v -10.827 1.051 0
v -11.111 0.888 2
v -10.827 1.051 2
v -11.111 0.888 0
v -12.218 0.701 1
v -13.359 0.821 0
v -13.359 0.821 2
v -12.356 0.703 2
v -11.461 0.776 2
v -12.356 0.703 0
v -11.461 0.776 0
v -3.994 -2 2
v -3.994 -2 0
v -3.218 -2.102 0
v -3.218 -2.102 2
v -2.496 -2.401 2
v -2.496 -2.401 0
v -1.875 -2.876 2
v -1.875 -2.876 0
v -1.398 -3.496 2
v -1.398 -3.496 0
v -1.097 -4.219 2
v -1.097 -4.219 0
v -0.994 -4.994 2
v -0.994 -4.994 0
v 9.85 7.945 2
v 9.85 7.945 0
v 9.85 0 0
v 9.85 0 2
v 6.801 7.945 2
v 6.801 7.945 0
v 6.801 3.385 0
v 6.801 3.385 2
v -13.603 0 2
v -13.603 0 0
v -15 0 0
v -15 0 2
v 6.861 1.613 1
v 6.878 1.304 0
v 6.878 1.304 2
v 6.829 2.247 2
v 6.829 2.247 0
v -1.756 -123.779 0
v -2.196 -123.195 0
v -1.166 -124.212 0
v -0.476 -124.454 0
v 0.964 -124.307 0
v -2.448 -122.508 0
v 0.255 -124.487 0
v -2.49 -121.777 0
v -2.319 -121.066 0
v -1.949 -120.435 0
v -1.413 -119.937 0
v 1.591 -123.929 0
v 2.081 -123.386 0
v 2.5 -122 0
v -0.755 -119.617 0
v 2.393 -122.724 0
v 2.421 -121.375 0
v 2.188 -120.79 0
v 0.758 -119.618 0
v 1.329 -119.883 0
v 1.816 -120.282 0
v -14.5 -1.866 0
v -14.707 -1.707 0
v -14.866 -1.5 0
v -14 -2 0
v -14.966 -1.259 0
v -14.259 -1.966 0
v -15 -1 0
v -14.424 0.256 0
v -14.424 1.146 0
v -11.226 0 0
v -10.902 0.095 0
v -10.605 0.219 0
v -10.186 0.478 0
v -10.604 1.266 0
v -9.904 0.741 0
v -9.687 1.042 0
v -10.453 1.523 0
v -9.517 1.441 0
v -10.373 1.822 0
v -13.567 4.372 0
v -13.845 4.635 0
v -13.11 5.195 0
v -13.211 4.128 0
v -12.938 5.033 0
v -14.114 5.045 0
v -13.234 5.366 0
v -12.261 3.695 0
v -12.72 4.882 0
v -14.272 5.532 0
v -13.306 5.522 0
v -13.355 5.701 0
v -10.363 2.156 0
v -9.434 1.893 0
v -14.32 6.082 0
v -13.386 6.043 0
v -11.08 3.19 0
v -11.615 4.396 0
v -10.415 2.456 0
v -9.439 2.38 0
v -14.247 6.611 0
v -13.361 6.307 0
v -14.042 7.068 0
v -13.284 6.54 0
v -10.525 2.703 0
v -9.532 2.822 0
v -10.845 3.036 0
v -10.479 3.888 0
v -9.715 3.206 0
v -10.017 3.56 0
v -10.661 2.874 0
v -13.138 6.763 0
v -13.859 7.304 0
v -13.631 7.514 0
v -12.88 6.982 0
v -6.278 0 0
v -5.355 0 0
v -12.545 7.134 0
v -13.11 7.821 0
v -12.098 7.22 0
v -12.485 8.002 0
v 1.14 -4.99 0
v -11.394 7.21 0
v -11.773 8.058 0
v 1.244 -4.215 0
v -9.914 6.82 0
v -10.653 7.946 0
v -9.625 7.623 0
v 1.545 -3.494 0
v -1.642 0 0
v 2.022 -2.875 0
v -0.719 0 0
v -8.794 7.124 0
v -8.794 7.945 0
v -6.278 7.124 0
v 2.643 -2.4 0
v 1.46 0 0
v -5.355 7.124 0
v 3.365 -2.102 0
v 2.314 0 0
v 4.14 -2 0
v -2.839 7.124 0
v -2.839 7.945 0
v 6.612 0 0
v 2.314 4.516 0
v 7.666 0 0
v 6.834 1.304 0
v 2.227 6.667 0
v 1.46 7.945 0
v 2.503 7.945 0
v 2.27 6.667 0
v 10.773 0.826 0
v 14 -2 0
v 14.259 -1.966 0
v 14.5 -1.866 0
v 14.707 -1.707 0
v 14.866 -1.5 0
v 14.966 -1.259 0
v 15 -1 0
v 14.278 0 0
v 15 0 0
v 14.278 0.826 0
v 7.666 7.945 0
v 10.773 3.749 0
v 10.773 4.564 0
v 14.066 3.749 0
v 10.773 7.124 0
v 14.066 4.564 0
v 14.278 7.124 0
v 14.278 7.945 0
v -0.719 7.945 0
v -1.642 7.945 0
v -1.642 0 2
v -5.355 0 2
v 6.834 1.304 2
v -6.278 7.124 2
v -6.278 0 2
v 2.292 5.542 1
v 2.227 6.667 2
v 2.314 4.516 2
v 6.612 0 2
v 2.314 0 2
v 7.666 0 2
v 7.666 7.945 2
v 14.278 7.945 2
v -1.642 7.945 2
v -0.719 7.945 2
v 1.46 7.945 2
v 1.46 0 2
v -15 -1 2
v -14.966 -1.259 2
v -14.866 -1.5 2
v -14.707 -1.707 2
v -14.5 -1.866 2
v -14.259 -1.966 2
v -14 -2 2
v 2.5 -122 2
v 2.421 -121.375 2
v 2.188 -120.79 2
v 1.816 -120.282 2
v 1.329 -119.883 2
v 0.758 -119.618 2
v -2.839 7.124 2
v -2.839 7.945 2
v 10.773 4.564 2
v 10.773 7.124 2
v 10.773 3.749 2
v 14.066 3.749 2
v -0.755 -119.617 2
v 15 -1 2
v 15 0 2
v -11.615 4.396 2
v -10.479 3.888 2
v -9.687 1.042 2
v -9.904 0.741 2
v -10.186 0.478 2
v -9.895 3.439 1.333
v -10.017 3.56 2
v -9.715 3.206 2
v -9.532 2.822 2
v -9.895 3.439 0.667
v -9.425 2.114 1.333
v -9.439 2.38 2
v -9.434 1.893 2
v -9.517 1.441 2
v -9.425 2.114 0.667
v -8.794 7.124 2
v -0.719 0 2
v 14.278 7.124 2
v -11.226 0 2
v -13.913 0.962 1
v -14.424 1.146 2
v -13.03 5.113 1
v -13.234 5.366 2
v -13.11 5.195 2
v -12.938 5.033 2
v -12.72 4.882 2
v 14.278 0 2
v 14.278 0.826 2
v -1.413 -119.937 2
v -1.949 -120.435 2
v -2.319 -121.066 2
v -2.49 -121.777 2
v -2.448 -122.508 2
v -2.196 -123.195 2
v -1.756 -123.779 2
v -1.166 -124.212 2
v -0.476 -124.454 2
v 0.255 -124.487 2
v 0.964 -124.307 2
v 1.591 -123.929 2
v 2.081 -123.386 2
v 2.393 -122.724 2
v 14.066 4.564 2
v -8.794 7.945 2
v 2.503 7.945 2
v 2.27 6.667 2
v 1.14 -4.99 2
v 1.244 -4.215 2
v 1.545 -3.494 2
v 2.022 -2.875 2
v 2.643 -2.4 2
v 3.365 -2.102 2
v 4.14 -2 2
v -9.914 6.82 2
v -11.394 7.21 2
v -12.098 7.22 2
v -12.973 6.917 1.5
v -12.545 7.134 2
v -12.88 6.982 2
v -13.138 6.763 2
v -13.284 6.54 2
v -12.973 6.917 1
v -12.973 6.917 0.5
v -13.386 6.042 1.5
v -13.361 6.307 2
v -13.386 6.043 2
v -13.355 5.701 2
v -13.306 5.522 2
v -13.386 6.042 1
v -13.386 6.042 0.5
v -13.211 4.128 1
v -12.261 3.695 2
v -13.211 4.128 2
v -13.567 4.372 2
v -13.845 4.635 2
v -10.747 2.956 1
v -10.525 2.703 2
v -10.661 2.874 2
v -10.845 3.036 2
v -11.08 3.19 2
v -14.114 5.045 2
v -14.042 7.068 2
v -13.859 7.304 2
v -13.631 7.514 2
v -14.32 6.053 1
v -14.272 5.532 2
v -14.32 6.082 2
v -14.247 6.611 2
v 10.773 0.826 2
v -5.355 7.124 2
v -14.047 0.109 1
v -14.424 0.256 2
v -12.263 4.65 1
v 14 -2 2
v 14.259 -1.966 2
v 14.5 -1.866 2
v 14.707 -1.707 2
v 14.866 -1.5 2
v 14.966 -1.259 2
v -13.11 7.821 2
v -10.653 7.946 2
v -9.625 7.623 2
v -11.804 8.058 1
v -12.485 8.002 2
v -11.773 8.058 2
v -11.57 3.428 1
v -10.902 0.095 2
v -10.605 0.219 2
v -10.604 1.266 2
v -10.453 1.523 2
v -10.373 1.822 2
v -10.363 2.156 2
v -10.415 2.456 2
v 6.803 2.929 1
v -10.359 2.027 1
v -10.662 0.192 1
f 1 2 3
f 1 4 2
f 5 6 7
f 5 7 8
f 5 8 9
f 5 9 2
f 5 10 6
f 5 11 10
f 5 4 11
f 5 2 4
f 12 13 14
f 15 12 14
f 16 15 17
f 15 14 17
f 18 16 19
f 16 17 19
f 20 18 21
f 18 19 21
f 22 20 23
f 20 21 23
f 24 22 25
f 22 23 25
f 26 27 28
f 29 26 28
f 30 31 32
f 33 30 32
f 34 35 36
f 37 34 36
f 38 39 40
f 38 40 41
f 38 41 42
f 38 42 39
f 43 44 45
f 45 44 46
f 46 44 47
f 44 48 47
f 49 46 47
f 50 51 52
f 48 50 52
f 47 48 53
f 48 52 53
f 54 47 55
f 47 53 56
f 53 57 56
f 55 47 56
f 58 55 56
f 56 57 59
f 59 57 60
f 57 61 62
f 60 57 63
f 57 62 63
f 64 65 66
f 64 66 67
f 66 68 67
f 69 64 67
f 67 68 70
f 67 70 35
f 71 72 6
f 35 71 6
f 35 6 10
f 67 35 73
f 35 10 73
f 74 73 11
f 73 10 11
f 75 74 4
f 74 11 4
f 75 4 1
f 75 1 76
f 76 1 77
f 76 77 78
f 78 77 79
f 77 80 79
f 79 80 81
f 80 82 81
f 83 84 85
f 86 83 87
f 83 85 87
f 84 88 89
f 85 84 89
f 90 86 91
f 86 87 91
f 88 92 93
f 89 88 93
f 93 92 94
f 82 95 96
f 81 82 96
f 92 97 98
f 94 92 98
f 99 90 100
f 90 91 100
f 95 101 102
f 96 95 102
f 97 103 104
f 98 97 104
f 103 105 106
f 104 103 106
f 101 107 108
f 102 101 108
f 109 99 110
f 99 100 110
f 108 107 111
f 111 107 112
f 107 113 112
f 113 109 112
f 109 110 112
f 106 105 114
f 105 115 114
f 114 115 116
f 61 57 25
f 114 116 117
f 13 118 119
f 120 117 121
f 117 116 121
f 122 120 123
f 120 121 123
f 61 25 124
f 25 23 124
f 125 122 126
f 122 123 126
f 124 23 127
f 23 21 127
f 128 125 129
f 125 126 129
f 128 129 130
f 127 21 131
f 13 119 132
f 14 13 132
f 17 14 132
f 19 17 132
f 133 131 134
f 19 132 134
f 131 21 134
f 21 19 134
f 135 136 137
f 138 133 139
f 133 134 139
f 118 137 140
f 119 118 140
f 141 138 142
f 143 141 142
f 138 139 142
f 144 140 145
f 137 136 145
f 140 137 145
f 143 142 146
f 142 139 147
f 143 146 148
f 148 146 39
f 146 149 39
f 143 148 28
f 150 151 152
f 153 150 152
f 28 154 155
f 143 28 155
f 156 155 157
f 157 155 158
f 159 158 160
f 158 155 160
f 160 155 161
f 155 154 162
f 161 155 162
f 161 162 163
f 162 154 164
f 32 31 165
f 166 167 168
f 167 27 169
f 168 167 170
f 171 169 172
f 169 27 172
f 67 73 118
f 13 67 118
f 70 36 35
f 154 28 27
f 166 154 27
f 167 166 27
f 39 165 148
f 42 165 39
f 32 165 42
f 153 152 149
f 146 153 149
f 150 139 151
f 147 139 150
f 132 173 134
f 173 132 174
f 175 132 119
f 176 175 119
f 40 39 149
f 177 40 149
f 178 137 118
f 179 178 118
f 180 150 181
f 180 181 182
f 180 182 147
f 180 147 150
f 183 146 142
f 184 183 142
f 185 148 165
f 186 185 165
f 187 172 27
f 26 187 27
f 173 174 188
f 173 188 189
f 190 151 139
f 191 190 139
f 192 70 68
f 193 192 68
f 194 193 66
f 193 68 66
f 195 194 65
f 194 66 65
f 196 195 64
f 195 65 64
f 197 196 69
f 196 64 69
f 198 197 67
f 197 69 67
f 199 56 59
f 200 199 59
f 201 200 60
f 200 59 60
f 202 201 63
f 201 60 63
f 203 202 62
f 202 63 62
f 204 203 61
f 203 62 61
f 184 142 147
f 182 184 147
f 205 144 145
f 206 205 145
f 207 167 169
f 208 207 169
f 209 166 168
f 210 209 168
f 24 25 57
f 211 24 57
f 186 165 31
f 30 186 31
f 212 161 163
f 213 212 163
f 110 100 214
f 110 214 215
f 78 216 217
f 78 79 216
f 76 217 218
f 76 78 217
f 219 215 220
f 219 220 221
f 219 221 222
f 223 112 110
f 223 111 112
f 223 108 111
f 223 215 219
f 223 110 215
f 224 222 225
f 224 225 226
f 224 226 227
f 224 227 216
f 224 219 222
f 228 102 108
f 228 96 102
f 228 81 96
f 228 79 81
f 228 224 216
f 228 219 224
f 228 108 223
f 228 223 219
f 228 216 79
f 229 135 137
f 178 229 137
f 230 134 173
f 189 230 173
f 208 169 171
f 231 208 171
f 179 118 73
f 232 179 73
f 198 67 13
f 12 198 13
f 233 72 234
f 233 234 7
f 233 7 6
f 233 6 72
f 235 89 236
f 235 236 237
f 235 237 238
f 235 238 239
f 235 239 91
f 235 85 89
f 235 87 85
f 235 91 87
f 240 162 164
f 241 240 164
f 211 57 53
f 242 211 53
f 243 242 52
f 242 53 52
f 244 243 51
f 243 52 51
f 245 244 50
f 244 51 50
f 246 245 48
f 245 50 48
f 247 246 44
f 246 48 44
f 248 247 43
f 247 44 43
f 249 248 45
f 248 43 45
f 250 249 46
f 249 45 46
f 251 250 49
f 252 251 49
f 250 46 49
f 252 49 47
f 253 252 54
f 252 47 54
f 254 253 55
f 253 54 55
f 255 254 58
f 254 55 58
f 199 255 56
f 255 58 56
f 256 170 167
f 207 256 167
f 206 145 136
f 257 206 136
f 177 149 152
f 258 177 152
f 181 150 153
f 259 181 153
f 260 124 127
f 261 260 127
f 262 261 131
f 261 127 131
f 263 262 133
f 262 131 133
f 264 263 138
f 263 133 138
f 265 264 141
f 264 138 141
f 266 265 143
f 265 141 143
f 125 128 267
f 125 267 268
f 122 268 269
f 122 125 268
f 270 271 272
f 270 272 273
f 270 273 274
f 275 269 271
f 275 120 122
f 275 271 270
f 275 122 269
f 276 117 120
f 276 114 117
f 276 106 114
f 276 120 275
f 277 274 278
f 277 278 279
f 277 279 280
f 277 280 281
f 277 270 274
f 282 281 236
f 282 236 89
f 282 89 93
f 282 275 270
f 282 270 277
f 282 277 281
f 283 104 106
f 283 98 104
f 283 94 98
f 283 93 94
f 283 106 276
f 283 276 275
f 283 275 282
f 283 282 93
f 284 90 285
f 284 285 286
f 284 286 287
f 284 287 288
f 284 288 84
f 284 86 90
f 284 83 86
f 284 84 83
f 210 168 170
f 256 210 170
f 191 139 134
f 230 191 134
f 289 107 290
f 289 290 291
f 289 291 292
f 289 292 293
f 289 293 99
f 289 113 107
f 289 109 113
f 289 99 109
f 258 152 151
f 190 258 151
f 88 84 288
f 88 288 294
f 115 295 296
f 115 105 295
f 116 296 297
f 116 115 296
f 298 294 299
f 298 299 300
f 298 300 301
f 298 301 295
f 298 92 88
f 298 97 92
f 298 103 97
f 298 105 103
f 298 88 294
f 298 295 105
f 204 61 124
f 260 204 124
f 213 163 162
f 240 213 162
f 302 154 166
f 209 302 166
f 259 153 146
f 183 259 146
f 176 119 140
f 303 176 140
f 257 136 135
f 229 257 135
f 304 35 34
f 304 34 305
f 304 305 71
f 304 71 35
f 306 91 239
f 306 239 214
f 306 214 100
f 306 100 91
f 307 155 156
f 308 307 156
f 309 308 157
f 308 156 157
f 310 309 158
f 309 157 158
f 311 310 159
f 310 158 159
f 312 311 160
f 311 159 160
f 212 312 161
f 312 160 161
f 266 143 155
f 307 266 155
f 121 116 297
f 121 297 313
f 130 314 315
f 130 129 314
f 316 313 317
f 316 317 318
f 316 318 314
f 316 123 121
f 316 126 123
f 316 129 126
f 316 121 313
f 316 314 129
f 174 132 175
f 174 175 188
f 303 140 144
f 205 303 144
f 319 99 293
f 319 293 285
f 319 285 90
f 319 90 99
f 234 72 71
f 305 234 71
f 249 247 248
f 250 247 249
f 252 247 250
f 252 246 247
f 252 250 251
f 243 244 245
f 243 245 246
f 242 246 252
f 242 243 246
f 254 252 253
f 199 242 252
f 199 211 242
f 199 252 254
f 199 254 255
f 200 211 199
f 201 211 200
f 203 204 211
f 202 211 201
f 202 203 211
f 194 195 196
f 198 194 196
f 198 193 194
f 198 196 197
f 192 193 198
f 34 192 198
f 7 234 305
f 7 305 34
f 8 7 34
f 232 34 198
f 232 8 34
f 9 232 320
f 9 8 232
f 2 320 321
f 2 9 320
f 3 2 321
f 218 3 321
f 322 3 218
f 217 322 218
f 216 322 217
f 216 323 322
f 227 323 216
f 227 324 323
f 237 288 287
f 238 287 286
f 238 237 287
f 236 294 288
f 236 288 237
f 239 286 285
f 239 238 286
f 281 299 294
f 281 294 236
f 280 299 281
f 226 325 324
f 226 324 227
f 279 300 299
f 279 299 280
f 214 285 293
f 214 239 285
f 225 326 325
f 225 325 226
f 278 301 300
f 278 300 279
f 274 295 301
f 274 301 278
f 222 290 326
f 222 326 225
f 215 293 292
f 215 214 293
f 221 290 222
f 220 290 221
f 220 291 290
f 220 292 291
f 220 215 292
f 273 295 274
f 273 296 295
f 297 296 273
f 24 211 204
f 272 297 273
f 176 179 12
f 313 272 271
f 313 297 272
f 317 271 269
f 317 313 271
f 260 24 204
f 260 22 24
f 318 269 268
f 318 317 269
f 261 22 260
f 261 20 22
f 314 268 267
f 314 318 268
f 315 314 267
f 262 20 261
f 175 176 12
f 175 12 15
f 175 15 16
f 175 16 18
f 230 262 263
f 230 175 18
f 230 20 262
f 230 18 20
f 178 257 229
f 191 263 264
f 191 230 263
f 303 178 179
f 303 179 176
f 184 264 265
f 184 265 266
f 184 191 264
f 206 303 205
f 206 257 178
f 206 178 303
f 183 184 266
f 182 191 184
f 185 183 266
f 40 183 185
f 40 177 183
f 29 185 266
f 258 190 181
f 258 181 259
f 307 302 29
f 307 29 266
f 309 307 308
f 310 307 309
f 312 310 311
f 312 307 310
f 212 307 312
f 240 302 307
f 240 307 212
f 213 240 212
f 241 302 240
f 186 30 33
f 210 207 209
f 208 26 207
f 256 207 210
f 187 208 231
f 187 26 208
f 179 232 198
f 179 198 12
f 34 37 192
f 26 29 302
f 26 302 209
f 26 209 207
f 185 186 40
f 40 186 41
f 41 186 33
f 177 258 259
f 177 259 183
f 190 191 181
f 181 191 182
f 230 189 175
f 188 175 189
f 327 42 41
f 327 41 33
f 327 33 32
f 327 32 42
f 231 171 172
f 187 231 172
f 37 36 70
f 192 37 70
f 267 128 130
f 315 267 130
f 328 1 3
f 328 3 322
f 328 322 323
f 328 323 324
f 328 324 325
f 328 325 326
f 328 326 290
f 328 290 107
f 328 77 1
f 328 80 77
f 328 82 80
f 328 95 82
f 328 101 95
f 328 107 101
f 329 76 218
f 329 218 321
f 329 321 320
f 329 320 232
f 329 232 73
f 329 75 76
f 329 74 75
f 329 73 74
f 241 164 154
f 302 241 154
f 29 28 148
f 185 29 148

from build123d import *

# Parameters (mm, degrees)
F0_W     = 0.9233176839
F0_H     = 7.9447052686
F1_DEPTH = 2


with BuildPart() as f1:
    # F0 (on Top) → F1 (new body)
    with BuildSketch(Plane.XY):
        Polygon((-6.278038602, 7.1239784385), (-6.278038602, 0), (-5.3547209181, 0), (-5.3547209181, 7.1239784385), (-2.8386367588, 7.1239784385), (-2.8386367588, 7.9447052686), (-8.7941227613, 7.9447052686), (-8.7941227613, 7.1239784385), align=None)
        with BuildLine():
            Line((-5.3547209181, 0), (-6.278038602, 0))
            Line((-6.278038602, 0), (-11.2261389214, 0))
            add(Edge.make_bspline(
                [(-11.2261389214, 0), (-11.6878851089, -0.1095461659), (-12.2509128847, -0.1095461659)],
                knots=[0.5682703015, 0.5682703015, 0.5682703015, 1, 1, 1], degree=2))
            add(Edge.make_bspline(
                [(-12.2509128847, -0.1095461659), (-13.0242578972, -0.1095461659), (-13.6025064048, 0)],
                knots=[0, 0, 0, 0.5477225575, 0.5477225575, 0.5477225575], degree=2))
            Line((-13.6025064048, 0), (-15, 0))
            Line((-15, 0), (-15, -1))
            ThreePointArc((-15, -1), (-14.7071067812, -1.7071067812), (-14, -2))
            Line((-14, -2), (-3.9937565104, -2))
            ThreePointArc((-3.9937565104, -2), (-1.8746470228, -2.8764711022), (-0.9937630208, -4.9937500136))
            Line((-0.9937630208, -4.9937500136), (-0.7549651684, -119.6167191533))
            ThreePointArc((-0.7549651684, -119.6167191533), (0.0015611574, -119.5000004874), (0.7579411203, -119.6176639074))
            Line((0.7579411203, -119.6176639074), (1.1400333331, -4.9900000556))
            ThreePointArc((1.1400333331, -4.9900000556), (2.0222347885, -2.8751470835), (4.1400166666, -2))
            Line((4.1400166666, -2), (14, -2))
            ThreePointArc((14, -2), (14.7071067812, -1.7071067812), (15, -1))
            Line((15, -1), (15, 0))
            Line((15, 0), (14.2783863676, 0))
            Line((14.2783863676, 0), (9.8495913754, 0))
            Line((9.8495913754, 0), (7.6656233698, 0))
            Line((7.6656233698, 0), (6.6118935837, 0))
            Line((6.6118935837, 0), (2.3135106938, 0))
            Line((2.3135106938, 0), (1.4597461311, 0))
            Line((1.4597461311, 0), (-0.7190053904, 0))
            Line((-0.7190053904, 0), (-1.6423230742, 0))
            Line((-1.6423230742, 0), (-5.3547209181, 0))
        make_face()
        with BuildLine():
            add(Edge.make_bspline(
                [(-11.2261389214, 0), (-11.6878851089, -0.1095461659), (-12.2509128847, -0.1095461659)],
                knots=[0.5682703015, 0.5682703015, 0.5682703015, 1, 1, 1], degree=2))
            Line((-11.2261389214, 0), (-13.6025064048, 0))
            add(Edge.make_bspline(
                [(-12.2509128847, -0.1095461659), (-13.0242578972, -0.1095461659), (-13.6025064048, 0)],
                knots=[0, 0, 0, 0.5477225575, 0.5477225575, 0.5477225575], degree=2))
        make_face()
        with BuildLine():
            Line((-13.6025064048, 0), (-11.2261389214, 0))
            add(Edge.make_bspline(
                [(-10.1860545992, 0.4781777082), (-10.6183589931, 0.1441916851), (-11.2261389214, 0)],
                knots=[0, 0, 0, 0.5682703015, 0.5682703015, 0.5682703015], degree=2))
            add(Edge.make_bspline(
                [(-9.4253173361, 2.1144148844), (-9.4253173361, 1.0659015823), (-10.1860545992, 0.4781777082)],
                knots=[0, 0, 0, 1, 1, 1], degree=2))
            add(Edge.make_bspline(
                [(-9.8948009042, 3.4394018432), (-9.4253173361, 2.9281864024), (-9.4253173361, 2.1144148844)],
                knots=[0, 0, 0, 1, 1, 1], degree=2))
            add(Edge.make_bspline(
                [(-11.6145018258, 4.3957572596), (-10.3642844723, 3.950617284), (-9.8948009042, 3.4394018432)],
                knots=[0, 0, 0, 1, 1, 1], degree=2))
            add(Edge.make_bspline(
                [(-12.7203964528, 4.881759694), (-12.3587202226, 4.6617979482), (-11.6145018258, 4.3957572596)],
                knots=[0, 0, 0, 1, 1, 1], degree=2))
            add(Edge.make_bspline(
                [(-13.2342201356, 5.3660233003), (-13.082072683, 5.1017214397), (-12.7203964528, 4.881759694)],
                knots=[0, 0, 0, 1, 1, 1], degree=2))
            add(Edge.make_bspline(
                [(-13.3863675882, 6.0424274039), (-13.3863675882, 5.6303251608), (-13.2342201356, 5.3660233003)],
                knots=[0, 0, 0, 1, 1, 1], degree=2))
            add(Edge.make_bspline(
                [(-12.9733959311, 6.917057903), (-13.3863675882, 6.6023300296), (-13.3863675882, 6.0424274039)],
                knots=[0, 0, 0, 1, 1, 1], degree=2))
            add(Edge.make_bspline(
                [(-11.8266388454, 7.2317857764), (-12.560424274, 7.2317857764), (-12.9733959311, 6.917057903)],
                knots=[0, 0, 0, 1, 1, 1], degree=2))
            add(Edge.make_bspline(
                [(-9.9139280125, 6.8196835333), (-10.8981046774, 7.2317857764), (-11.8266388454, 7.2317857764)],
                knots=[0, 0, 0, 1, 1, 1], degree=2))
            Line((-9.9139280125, 6.8196835333), (-9.6252825596, 7.6230220831))
            add(Edge.make_bspline(
                [(-11.804034081, 8.0577290906), (-10.6198921927, 8.0577290906), (-9.6252825596, 7.6230220831)],
                knots=[0, 0, 0, 1, 1, 1], degree=2))
            add(Edge.make_bspline(
                [(-13.6306729264, 7.5143453312), (-12.9412276126, 8.0577290906), (-11.804034081, 8.0577290906)],
                knots=[0, 0, 0, 1, 1, 1], degree=2))
            add(Edge.make_bspline(
                [(-14.3201182403, 6.0528603721), (-14.3201182403, 6.9709615719), (-13.6306729264, 7.5143453312)],
                knots=[0, 0, 0, 1, 1, 1], degree=2))
            add(Edge.make_bspline(
                [(-13.8445487741, 4.6348461137), (-14.3201182403, 5.1782298731), (-14.3201182403, 6.0528603721)],
                knots=[0, 0, 0, 1, 1, 1], degree=2))
            add(Edge.make_bspline(
                [(-12.2613458529, 3.6950095636), (-13.3689793079, 4.0914623544), (-13.8445487741, 4.6348461137)],
                knots=[0, 0, 0, 1, 1, 1], degree=2))
            add(Edge.make_bspline(
                [(-11.0798122066, 3.1898800209), (-11.4684402713, 3.4133194227), (-12.2613458529, 3.6950095636)],
                knots=[0, 0, 0, 1, 1, 1], degree=2))
            add(Edge.make_bspline(
                [(-10.525126065, 2.7030081725), (-10.6911841419, 2.966440619), (-11.0798122066, 3.1898800209)],
                knots=[0, 0, 0, 1, 1, 1], degree=2))
            add(Edge.make_bspline(
                [(-10.3590679882, 2.0274734829), (-10.3590679882, 2.439575726), (-10.525126065, 2.7030081725)],
                knots=[0, 0, 0, 1, 1, 1], degree=2))
            add(Edge.make_bspline(
                [(-10.8268127282, 1.0511215441), (-10.3590679882, 1.4014953921), (-10.3590679882, 2.0274734829)],
                knots=[0, 0, 0, 1, 1, 1], degree=2))
            add(Edge.make_bspline(
                [(-12.2178751521, 0.7007476961), (-11.2945574683, 0.7007476961), (-10.8268127282, 1.0511215441)],
                knots=[0, 0, 0, 1, 1, 1], degree=2))
            add(Edge.make_bspline(
                [(-13.3585463398, 0.8207268301), (-12.7829942619, 0.7007476961), (-12.2178751521, 0.7007476961)],
                knots=[0, 0, 0, 1, 1, 1], degree=2))
            add(Edge.make_bspline(
                [(-14.4244479221, 1.1458876717), (-13.9340984177, 0.9407059642), (-13.3585463398, 0.8207268301)],
                knots=[0, 0, 0, 1, 1, 1], degree=2))
            Line((-14.4244479221, 1.1458876717), (-14.4244479221, 0.2556077204))
            add(Edge.make_bspline(
                [(-13.6025064048, 0), (-14.079990402, 0.0904568546), (-14.4244479221, 0.2556077204)],
                knots=[0.5477225575, 0.5477225575, 0.5477225575, 1, 1, 1], degree=2))
        make_face()
        with Locations((-1.1806642323, 3.9723526343)):
            Rectangle(F0_W, F0_H)
        with BuildLine():
            Line((1.4597461311, 7.9447052686), (1.4597461311, 0))
            Line((1.4597461311, 0), (2.3135106938, 0))
            Line((2.3135106938, 0), (2.3135106938, 4.5157363937))
            add(Edge.make_bspline(
                [(2.2265692923, 6.6666666667), (2.3135106938, 5.4929577465), (2.3135106938, 4.5157363937)],
                knots=[0, 0, 0, 1, 1, 1], degree=2))
            Line((2.2265692923, 6.6666666667), (2.270039993, 6.6666666667))
            Line((2.270039993, 6.6666666667), (6.6118935837, 0))
            Line((6.6118935837, 0), (7.6656233698, 0))
            Line((7.6656233698, 0), (7.6656233698, 7.9447052686))
            Line((7.6656233698, 7.9447052686), (6.801425839, 7.9447052686))
            Line((6.801425839, 7.9447052686), (6.801425839, 3.3854981742))
            add(Edge.make_bspline(
                [(6.8292470875, 2.2465658146), (6.7909928708, 3.0429490523), (6.801425839, 3.3854981742)],
                knots=[0, 0, 0, 1, 1, 1], degree=2))
            add(Edge.make_bspline(
                [(6.8779342723, 1.3041210224), (6.8675013041, 1.4501825769), (6.8292470875, 2.2465658146)],
                knots=[0, 0, 0, 1, 1, 1], degree=2))
            Line((6.8779342723, 1.3041210224), (6.8344635716, 1.3041210224))
            Line((6.8344635716, 1.3041210224), (2.5030429491, 7.9447052686))
            Line((2.5030429491, 7.9447052686), (1.4597461311, 7.9447052686))
        make_face()
        Polygon((9.8495913754, 7.9447052686), (9.8495913754, 0), (14.2783863676, 0), (14.2783863676, 0.8259433142), (10.7729090593, 0.8259433142), (10.7729090593, 3.7489132325), (14.0662493479, 3.7489132325), (14.0662493479, 4.5644235785), (10.7729090593, 4.5644235785), (10.7729090593, 7.1239784385), (14.2783863676, 7.1239784385), (14.2783863676, 7.9447052686), align=None)
        with BuildLine():
            ThreePointArc((0.7579411203, -119.6176639074), (0.0015611574, -119.5000004874), (-0.7549651684, -119.6167191533))
            ThreePointArc((-0.7549651684, -119.6167191533), (-1.4769202888, -124.0171034829), (2.5, -122))
            ThreePointArc((2.5, -122), (2.0180253716, -120.5243396056), (0.7579411203, -119.6176639074))
        make_face()
    extrude(amount=F1_DEPTH)


solid = f1.part
